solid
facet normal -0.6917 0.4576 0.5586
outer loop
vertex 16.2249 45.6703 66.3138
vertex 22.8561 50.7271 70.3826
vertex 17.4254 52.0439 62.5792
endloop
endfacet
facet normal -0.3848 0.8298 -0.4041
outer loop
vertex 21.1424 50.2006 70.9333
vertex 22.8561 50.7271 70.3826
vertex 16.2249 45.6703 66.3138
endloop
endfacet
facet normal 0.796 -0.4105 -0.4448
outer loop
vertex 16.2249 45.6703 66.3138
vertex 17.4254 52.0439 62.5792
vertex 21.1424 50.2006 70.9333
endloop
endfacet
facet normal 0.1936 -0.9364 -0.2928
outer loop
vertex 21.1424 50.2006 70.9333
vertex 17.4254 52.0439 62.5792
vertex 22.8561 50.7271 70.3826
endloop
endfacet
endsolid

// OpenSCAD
// Auto-generated auxetic polyhedron
points = [
    [17.425373, 52.043894, 62.579152],
    [22.856071, 50.727144, 70.382550],
    [16.224862, 45.670303, 66.313827],
    [21.142415, 50.200646, 70.933277],
];

faces = [
    [0, 1, 2],
    [2, 1, 3],
    [3, 0, 2],
    [1, 0, 3],
];

polyhedron(points = points, faces = faces);
